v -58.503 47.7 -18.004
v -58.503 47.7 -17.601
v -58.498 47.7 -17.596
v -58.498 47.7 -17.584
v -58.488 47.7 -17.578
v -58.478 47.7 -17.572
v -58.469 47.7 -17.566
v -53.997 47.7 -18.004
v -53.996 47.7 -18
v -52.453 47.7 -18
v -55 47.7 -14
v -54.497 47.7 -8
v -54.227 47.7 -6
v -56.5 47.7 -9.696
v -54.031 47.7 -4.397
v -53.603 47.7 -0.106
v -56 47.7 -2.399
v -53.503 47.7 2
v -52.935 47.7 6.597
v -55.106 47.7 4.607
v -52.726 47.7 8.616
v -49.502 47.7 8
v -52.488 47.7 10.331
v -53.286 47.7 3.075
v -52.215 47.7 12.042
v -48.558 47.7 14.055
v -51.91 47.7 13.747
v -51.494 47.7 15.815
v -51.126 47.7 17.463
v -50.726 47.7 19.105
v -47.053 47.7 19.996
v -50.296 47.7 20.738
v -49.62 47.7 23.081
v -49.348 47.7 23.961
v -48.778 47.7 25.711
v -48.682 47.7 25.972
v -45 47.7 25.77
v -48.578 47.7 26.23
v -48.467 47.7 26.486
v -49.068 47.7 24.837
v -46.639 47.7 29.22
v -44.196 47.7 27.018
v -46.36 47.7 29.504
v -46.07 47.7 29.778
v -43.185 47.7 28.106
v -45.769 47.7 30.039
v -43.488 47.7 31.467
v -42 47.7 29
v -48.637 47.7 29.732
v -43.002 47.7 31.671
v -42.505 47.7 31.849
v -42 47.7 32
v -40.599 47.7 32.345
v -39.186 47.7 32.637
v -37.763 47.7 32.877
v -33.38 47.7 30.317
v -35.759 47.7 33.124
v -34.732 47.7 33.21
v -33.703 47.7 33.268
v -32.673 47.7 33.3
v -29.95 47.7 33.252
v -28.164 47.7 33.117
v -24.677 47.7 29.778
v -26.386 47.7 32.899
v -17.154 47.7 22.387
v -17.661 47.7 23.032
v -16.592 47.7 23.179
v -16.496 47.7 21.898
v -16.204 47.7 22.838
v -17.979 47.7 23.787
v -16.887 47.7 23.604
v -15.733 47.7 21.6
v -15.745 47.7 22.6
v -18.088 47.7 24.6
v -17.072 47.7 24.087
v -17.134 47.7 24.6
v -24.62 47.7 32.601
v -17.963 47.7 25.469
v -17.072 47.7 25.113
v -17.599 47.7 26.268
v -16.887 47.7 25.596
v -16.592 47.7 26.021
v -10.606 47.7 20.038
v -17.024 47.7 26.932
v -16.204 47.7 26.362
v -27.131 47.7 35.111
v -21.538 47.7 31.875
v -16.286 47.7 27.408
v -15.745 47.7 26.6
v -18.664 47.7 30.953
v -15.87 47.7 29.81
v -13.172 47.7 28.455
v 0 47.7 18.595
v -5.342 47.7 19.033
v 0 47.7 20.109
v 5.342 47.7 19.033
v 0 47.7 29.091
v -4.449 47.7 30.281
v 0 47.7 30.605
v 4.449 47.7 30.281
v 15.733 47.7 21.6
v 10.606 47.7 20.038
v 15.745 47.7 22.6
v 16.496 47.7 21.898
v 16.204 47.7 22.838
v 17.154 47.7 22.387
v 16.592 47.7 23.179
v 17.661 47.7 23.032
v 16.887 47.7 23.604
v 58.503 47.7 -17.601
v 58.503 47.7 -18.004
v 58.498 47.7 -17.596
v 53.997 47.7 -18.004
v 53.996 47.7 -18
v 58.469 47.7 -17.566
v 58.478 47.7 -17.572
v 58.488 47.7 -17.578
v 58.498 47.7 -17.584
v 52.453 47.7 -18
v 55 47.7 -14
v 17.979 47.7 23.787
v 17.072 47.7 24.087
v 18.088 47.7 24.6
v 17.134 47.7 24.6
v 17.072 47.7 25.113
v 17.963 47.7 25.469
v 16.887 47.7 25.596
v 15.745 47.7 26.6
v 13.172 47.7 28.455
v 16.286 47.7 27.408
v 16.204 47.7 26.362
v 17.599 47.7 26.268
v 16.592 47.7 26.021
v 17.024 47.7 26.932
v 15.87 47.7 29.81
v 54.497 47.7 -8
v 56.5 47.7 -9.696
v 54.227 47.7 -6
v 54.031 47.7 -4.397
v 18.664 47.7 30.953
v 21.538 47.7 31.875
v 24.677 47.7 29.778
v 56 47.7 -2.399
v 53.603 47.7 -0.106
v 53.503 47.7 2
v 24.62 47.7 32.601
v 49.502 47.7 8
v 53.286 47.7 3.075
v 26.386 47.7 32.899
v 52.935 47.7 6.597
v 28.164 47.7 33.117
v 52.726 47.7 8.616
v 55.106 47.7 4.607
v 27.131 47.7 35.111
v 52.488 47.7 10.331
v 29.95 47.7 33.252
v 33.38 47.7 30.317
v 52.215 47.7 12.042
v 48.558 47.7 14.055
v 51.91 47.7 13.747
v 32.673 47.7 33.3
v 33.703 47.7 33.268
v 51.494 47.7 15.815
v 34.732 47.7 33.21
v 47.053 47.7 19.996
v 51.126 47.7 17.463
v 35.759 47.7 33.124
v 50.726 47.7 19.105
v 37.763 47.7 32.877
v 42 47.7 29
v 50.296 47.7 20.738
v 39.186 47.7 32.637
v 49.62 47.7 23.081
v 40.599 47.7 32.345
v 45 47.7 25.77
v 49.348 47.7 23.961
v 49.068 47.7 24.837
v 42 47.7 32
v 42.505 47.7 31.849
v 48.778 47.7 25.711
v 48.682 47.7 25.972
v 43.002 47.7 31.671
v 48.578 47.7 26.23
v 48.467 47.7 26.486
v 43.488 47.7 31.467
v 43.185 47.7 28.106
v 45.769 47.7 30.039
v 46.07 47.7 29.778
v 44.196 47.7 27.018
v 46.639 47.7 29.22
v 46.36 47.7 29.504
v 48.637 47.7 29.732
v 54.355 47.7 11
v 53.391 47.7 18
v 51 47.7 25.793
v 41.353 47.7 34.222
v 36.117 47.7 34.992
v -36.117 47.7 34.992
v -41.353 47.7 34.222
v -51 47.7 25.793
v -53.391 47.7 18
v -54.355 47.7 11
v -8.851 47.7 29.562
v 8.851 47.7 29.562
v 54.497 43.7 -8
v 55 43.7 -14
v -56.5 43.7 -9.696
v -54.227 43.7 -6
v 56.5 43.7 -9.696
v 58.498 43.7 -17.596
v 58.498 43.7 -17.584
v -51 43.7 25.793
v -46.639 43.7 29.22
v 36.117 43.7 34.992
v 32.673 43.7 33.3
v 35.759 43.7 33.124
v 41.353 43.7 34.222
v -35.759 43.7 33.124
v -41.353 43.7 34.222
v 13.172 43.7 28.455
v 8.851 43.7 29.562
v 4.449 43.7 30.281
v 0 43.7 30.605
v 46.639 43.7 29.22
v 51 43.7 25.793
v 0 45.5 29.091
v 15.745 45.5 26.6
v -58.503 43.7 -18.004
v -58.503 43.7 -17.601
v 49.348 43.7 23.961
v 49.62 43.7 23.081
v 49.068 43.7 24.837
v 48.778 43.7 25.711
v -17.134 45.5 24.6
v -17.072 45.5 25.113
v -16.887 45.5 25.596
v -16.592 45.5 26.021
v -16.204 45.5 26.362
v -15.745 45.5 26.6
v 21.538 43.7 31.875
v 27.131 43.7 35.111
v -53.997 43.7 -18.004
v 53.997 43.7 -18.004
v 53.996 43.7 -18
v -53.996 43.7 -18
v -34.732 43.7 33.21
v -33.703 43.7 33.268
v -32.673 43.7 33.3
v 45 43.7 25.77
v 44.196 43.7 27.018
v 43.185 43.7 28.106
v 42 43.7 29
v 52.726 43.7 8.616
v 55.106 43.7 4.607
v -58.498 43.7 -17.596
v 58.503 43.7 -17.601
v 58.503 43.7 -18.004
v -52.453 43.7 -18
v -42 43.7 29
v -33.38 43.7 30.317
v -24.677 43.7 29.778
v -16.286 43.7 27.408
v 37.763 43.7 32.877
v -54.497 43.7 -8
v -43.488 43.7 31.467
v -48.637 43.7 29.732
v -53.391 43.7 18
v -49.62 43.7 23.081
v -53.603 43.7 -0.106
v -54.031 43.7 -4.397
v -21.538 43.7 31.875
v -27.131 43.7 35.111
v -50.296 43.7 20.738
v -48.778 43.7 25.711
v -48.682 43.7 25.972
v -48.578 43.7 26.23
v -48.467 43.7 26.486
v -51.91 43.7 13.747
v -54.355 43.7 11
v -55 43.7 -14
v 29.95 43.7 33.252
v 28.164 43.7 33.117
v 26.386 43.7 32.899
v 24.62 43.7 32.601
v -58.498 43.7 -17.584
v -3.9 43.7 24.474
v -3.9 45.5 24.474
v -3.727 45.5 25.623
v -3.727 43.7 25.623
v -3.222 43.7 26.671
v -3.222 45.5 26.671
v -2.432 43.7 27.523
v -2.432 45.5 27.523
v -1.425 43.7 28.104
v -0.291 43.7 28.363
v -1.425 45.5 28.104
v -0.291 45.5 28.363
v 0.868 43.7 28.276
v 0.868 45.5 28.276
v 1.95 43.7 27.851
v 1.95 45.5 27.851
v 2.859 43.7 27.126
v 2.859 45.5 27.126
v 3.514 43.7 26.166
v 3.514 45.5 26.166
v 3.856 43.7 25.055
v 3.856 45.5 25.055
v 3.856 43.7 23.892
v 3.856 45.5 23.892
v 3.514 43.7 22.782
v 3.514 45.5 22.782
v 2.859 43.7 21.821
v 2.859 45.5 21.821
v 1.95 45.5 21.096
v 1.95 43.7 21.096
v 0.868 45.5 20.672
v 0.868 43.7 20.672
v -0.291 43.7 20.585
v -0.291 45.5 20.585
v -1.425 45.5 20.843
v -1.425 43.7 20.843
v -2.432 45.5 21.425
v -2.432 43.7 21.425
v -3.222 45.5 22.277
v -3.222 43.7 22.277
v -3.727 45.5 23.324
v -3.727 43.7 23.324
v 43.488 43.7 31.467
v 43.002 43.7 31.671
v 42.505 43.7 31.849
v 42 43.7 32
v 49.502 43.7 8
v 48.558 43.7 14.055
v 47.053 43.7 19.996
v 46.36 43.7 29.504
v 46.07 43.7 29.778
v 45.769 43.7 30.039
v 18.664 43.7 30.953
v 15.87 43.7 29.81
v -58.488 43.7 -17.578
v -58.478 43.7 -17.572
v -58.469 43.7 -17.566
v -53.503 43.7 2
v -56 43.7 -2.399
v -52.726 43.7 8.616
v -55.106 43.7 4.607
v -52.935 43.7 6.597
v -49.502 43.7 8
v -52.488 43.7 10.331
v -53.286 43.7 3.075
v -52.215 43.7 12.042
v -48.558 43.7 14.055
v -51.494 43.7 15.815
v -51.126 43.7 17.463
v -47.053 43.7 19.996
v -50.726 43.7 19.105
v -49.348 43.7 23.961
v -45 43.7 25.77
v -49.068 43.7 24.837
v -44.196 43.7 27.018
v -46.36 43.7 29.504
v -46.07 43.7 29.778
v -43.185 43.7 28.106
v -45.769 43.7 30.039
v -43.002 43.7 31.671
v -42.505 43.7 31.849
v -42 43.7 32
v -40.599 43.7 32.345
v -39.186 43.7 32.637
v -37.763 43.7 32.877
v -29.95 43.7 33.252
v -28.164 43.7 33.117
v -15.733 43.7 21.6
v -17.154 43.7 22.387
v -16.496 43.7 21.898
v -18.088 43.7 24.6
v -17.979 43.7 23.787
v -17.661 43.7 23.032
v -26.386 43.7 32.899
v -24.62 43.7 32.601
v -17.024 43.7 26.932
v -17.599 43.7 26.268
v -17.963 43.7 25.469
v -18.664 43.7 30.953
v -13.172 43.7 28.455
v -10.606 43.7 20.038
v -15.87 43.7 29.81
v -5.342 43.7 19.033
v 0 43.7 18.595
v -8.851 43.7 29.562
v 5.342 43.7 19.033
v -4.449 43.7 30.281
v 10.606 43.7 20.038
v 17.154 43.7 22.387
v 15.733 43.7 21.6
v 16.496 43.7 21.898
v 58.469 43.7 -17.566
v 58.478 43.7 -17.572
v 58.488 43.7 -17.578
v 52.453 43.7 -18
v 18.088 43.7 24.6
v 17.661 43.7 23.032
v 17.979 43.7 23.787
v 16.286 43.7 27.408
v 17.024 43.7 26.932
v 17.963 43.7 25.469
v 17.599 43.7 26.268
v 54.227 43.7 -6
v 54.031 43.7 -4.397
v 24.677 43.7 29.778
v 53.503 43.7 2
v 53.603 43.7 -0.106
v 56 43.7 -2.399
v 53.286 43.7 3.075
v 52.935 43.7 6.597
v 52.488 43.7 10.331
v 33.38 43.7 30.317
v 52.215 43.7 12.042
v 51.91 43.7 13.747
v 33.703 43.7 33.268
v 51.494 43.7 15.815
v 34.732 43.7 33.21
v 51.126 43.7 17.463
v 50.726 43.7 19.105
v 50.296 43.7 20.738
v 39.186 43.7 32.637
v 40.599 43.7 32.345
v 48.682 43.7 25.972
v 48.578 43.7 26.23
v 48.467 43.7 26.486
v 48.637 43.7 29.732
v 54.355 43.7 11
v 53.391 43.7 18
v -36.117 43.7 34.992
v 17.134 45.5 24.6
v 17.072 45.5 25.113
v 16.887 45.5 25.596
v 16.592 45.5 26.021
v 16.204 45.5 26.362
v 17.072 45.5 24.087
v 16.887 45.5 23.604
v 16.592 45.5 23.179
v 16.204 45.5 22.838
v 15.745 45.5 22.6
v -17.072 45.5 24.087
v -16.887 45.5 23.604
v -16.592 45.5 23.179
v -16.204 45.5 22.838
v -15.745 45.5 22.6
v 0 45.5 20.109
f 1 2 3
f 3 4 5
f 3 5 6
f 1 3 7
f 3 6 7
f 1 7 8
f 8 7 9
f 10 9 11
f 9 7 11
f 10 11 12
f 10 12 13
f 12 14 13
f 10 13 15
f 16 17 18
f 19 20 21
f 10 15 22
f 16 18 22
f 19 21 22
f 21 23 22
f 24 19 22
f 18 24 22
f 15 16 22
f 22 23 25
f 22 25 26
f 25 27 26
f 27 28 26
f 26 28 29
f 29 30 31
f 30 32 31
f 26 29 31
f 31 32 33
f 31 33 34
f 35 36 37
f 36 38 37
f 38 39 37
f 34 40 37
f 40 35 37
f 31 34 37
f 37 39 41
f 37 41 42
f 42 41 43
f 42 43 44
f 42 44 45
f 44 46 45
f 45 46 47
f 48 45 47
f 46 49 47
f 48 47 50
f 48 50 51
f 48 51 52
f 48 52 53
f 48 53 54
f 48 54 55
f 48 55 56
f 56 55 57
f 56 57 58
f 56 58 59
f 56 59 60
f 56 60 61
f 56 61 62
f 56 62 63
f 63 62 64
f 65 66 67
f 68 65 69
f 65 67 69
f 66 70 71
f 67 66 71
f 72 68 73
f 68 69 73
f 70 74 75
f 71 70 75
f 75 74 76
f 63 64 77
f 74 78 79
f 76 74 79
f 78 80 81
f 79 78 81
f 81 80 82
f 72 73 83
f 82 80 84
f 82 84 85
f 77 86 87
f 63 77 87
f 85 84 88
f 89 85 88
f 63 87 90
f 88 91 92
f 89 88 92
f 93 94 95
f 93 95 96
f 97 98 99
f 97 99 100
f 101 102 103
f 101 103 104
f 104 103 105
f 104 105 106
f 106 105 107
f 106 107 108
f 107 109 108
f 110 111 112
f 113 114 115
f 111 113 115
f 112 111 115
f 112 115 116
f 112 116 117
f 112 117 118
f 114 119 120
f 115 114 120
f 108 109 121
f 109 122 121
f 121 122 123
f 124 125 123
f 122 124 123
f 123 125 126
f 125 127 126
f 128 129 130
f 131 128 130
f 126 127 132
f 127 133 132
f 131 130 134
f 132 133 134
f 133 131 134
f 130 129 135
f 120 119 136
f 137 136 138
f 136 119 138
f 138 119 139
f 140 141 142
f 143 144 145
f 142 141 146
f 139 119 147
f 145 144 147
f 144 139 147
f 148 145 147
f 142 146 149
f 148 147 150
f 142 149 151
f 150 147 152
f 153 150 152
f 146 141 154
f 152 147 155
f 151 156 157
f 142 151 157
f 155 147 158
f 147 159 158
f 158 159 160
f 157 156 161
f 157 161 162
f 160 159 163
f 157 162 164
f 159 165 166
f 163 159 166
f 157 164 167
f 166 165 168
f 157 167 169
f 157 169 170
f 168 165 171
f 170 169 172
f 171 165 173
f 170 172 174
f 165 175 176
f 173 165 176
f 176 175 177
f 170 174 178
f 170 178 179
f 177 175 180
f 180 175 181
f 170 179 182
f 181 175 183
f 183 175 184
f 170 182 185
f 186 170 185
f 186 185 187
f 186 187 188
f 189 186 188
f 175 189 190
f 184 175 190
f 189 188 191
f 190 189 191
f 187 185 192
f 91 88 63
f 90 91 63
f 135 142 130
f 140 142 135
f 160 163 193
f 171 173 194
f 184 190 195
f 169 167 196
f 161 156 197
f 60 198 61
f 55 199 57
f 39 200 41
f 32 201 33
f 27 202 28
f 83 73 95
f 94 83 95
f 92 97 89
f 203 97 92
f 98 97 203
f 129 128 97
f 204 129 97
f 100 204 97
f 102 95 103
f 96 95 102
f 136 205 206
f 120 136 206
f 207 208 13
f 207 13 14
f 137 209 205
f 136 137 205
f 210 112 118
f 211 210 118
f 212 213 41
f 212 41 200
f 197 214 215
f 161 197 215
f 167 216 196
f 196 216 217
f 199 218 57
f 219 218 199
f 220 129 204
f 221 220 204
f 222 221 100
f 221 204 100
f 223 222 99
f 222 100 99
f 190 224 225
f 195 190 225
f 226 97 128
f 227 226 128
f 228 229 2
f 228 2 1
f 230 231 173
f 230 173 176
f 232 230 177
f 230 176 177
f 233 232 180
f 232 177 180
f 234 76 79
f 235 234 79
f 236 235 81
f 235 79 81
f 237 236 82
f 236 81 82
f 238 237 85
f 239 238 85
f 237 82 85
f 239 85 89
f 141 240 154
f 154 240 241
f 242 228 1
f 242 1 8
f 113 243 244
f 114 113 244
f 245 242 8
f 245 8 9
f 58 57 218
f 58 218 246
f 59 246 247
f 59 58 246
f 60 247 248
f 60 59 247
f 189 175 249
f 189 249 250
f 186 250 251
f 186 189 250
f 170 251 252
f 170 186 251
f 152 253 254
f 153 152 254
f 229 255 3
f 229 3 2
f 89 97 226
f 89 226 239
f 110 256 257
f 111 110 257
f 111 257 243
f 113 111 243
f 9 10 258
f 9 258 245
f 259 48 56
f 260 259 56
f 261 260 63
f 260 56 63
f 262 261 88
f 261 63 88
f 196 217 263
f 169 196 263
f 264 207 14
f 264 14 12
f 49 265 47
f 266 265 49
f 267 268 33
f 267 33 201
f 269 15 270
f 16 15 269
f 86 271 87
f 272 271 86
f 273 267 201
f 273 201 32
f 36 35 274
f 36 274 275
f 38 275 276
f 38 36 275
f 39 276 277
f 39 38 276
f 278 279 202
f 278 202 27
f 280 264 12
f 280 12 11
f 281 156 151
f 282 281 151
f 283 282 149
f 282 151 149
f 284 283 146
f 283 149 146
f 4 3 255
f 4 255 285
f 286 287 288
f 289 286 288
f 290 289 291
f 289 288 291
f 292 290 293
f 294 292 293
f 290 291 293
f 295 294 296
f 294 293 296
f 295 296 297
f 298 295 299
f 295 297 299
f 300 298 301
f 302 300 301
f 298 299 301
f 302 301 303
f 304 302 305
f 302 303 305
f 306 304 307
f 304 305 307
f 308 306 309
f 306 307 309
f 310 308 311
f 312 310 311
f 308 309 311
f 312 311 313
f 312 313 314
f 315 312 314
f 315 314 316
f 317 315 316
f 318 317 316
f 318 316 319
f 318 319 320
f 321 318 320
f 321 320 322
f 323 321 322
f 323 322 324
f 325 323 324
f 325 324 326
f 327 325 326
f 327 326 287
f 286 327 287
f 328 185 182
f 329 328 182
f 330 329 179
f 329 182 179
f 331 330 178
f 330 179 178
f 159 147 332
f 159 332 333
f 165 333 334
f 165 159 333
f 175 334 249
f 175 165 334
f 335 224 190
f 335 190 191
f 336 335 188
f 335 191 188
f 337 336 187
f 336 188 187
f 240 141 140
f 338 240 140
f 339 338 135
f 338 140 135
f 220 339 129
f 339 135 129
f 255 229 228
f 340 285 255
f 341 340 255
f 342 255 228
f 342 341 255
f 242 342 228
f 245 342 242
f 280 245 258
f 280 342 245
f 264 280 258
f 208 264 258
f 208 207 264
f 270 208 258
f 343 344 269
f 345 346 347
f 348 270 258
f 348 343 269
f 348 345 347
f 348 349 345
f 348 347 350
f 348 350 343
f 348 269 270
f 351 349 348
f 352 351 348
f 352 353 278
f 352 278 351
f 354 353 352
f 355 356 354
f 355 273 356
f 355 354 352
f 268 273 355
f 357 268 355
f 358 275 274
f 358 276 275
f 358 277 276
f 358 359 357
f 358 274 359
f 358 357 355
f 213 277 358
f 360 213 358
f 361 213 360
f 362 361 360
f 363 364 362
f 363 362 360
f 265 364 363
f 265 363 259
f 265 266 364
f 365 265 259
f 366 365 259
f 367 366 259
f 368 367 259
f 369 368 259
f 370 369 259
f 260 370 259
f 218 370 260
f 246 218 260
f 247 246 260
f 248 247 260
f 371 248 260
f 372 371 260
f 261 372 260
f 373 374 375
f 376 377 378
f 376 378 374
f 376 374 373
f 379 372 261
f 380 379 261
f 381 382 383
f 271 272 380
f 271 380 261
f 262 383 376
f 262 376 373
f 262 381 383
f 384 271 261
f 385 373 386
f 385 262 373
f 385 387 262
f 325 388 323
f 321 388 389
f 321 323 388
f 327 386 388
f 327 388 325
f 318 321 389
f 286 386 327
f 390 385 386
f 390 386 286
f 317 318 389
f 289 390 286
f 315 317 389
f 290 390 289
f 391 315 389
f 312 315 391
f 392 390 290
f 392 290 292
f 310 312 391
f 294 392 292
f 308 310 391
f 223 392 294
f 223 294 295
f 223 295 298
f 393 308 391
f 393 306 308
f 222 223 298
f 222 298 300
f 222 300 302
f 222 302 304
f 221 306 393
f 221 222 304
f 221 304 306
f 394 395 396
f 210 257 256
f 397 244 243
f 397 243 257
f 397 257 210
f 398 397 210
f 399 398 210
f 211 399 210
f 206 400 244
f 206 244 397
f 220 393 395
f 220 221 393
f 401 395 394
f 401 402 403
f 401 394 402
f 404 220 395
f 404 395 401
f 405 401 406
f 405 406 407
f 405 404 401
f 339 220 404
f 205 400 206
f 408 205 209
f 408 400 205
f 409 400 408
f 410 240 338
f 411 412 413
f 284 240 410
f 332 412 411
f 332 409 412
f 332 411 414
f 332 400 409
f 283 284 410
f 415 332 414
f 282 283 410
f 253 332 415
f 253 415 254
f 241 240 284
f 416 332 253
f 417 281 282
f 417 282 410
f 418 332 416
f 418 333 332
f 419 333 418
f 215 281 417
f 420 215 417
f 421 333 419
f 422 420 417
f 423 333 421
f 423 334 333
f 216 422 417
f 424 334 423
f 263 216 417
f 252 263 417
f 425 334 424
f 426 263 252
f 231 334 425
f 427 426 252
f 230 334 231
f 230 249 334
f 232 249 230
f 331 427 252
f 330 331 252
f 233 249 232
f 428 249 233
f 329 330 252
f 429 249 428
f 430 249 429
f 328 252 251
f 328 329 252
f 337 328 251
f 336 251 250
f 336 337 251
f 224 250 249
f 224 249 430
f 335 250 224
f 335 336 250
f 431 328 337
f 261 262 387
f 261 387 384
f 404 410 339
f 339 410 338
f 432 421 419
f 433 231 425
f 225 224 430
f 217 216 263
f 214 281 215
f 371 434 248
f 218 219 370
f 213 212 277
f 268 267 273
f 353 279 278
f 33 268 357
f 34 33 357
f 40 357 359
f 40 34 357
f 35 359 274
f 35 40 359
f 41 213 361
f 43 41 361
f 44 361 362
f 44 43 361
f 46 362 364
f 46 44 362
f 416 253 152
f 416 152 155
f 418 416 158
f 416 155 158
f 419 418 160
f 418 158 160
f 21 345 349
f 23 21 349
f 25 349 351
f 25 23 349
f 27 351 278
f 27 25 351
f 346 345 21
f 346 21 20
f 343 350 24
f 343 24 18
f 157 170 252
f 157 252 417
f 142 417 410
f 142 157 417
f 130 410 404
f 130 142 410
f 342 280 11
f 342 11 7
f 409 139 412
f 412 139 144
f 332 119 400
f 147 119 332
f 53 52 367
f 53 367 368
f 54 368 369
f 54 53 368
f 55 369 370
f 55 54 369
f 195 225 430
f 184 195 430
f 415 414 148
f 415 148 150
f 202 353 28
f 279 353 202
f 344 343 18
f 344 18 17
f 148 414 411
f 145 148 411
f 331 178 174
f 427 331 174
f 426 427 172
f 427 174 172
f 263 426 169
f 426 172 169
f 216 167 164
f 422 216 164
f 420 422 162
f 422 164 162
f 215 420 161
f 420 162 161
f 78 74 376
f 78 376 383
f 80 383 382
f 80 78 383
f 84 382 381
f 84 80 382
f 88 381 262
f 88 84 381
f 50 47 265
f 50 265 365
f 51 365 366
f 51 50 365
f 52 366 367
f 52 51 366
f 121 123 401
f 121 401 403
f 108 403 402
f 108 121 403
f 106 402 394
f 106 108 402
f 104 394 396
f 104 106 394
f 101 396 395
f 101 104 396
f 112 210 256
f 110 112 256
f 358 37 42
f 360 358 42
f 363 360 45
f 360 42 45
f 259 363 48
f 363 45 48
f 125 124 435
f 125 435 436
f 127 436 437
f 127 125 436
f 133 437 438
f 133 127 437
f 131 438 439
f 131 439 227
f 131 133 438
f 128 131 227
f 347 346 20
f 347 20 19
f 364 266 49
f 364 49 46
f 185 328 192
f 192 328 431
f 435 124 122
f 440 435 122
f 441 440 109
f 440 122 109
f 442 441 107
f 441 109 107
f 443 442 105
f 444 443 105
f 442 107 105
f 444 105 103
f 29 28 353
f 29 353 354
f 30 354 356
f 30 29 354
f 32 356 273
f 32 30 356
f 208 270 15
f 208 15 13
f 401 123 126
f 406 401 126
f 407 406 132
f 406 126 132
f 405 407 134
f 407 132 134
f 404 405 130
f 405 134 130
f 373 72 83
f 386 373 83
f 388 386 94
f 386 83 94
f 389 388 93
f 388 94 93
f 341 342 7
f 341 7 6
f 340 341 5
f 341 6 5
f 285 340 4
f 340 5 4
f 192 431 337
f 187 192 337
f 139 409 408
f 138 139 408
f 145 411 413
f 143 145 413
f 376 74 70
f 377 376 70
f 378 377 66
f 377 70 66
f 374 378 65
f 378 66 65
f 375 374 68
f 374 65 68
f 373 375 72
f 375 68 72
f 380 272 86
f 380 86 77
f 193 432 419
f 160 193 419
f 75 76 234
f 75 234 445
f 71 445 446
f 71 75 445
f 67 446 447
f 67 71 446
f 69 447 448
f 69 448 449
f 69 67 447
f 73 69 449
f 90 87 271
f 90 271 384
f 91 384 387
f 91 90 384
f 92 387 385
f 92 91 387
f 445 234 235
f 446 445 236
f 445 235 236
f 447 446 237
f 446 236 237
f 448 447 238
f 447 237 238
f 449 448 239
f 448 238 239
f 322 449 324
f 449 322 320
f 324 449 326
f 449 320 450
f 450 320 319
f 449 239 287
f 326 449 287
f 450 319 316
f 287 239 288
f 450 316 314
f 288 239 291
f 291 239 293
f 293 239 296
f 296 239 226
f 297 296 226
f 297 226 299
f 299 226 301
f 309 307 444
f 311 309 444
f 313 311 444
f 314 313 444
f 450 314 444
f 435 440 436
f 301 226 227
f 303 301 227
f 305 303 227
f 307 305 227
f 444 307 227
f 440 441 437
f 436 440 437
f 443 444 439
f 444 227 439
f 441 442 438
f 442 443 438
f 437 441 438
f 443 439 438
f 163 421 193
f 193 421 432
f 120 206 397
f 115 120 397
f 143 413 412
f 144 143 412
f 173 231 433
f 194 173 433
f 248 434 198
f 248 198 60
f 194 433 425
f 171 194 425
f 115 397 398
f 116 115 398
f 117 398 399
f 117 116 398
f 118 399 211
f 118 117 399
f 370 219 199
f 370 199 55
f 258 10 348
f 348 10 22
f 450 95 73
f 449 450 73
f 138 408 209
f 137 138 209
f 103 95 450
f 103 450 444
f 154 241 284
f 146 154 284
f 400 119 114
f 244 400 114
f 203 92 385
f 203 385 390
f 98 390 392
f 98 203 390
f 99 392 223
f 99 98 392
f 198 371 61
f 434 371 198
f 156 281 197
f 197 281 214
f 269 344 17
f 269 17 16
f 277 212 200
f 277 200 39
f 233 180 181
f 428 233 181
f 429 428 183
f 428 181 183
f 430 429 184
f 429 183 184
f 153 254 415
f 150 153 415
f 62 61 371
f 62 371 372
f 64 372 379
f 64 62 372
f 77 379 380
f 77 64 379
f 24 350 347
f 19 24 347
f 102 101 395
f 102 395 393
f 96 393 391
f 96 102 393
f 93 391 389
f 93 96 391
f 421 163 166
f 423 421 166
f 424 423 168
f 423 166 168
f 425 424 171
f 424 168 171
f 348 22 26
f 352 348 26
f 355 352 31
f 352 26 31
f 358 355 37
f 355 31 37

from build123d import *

# Parameters (mm, degrees)
PAD034_DEPTH       = 4
PAD032_DEPTH       = 4
POCKET003027_DEPTH = 2.2
PAD033_DEPTH       = 4
SKETCH054_R        = 3.9
POCKET003028_DEPTH = 10


with BuildPart() as central_leg_insect_add:
    # Sketch055 → Pad034 (new body)
    with BuildSketch(Plane.XZ.offset(-43.7)):
        Polygon((-58.503296, -18.004301), (-53.997036, -18.004301), (-48.744877, 15.965196), (-44.5658, 27.943165), (-41.53833, 30.02603), (-31.626242, 31.40176), (-21.017805, 29.65671), (-18.990362, 30.401161), (-27.13097, 35.111233), (-22.936073, 30.916338), (-29.003351, 32.984856), (-36.116627, 34.99157), (-32.000511, 32.969288), (-34.972557, 32.969288), (-41.352551, 34.221657), (-37, 32.591213), (-43, 31.631081), (-48.636986, 29.73181), (-44, 30.22826), (-46, 29.721722), (-51, 25.793291), (-47.464714, 26.759798), (-49.314915, 23.492535), (-53.390827, 18), (-50, 21), (-51, 16.646269), (-54.355499, 11), (-51.685394, 14), (-52.498241, 9), (-55.106018, 4.606695), (-52.495518, 7), (-53.502594, 2), (-56, -2.398534), (-53.492668, 0), (-54.22747, -6), (-56.500393, -9.69598), (-54.497387, -8), (-55, -14), (-58.503296, -17.601286), align=None)
    extrude(amount=-PAD034_DEPTH)


with BuildPart() as quarter_central_leg_servo_support:
    # Sketch050 → Pad032 (new body)
    with BuildSketch(Plane(origin=(0, 47.7, 24.6), x_dir=(-1, 0, 0), z_dir=(0, 1, 0))):
        with BuildLine():
            ThreePointArc((15.732627, 3), (7.987175, 5.135172), (0, 6.004658))
            Line((0, 6.004658), (0, 4.275313))
            Line((0, 4.275313), (0, 0))
            Line((16.774147, 0), (0, 0))
            Line((18.088162, 0), (16.774147, 0))
            ThreePointArc((18.088162, 0), (17.428911, 1.907128), (15.732627, 3))
        make_face()
    extrude(amount=-PAD032_DEPTH)

    # Sketch051 → Pocket003027 (cut)
    with BuildSketch(Plane(origin=(0, 47.7, 24.6), x_dir=(-1, 0, 0), z_dir=(0, 1, 0))):
        with BuildLine():
            Line((0, 4.49111), (15.744728, 2.000001))
            ThreePointArc((17.134156, 0), (16.75271, 1.217632), (15.744728, 2.000001))
            Line((17.134156, 0), (0, 0))
            Line((0, 0), (0, 4.49111))
        make_face()
    extrude(amount=-POCKET003027_DEPTH, mode=Mode.SUBTRACT)


with BuildPart() as half_leg_insect:
    # Part__Mirroring001: instance of quarter_central_leg_servo_support
    add(quarter_central_leg_servo_support.part.mirror(Plane(origin=(0, 0, 24.6), x_dir=(0, 1, 0), z_dir=(0, 0, 1))))

    # Fusion007017: union quarter_central_leg_servo_support
    add(quarter_central_leg_servo_support.part)

    # Sketch052 → Pad033 (new body)
    with BuildSketch(Plane(origin=(0, 47.7, 0), x_dir=(-1, 0, 0), z_dir=(0, 1, 0))):
        with BuildLine():
            Line((52.452988, -18.000002), (58.497849, -18.000002))
            Line((58.497849, -18.000002), (58.497849, -17.584217))
            ThreePointArc((54.988709, -14), (56.535613, -15.995425), (58.497849, -17.584217))
            Line((54.988709, -14), (52.759255, 8.35829))
            ThreePointArc((52.759255, 8.35829), (51.202034, 17.133916), (48.77817, 25.710712))
            ThreePointArc((48.77817, 25.710712), (46.1643, 29.690829), (42.000002, 32))
            ThreePointArc((42.000002, 32), (27.145674, 33.002324), (13.00001, 28.359486))
            Line((16, 27.29138), (13.00001, 28.359486))
            ThreePointArc((41.999998, 28.999997), (28.860359, 30.270585), (16, 27.29138))
            ThreePointArc((44.999996, 25.769916), (43.714535, 27.584213), (41.999998, 28.999997))
            ThreePointArc((49.501895, 8.000017), (47.87481, 17.043019), (44.999996, 25.769916))
            Line((52.452988, -18.000002), (49.501895, 8.000017))
        make_face()
    extrude(amount=-PAD033_DEPTH)

    # Fusion007018: union central_leg_insect_add
    add(central_leg_insect_add.part)


with BuildPart() as central_leg_sg092:
    # Part__Mirroring002: instance of half_leg_insect
    add(half_leg_insect.part.mirror(Plane(origin=(0, 0, 0), x_dir=(0, -1, 0), z_dir=(1, 0, 0))))

    # Fusion007019: union half_leg_insect
    add(half_leg_insect.part)

    # Sketch054 → Pocket003028 (cut)
    with BuildSketch(Plane(origin=(0, 45.5, 0), x_dir=(-1, 0, 0), z_dir=(0, 1, 0))):
        with Locations((0, 24.473736)):
            Circle(SKETCH054_R)
    extrude(amount=-POCKET003028_DEPTH, mode=Mode.SUBTRACT)


solid = central_leg_sg092.part
